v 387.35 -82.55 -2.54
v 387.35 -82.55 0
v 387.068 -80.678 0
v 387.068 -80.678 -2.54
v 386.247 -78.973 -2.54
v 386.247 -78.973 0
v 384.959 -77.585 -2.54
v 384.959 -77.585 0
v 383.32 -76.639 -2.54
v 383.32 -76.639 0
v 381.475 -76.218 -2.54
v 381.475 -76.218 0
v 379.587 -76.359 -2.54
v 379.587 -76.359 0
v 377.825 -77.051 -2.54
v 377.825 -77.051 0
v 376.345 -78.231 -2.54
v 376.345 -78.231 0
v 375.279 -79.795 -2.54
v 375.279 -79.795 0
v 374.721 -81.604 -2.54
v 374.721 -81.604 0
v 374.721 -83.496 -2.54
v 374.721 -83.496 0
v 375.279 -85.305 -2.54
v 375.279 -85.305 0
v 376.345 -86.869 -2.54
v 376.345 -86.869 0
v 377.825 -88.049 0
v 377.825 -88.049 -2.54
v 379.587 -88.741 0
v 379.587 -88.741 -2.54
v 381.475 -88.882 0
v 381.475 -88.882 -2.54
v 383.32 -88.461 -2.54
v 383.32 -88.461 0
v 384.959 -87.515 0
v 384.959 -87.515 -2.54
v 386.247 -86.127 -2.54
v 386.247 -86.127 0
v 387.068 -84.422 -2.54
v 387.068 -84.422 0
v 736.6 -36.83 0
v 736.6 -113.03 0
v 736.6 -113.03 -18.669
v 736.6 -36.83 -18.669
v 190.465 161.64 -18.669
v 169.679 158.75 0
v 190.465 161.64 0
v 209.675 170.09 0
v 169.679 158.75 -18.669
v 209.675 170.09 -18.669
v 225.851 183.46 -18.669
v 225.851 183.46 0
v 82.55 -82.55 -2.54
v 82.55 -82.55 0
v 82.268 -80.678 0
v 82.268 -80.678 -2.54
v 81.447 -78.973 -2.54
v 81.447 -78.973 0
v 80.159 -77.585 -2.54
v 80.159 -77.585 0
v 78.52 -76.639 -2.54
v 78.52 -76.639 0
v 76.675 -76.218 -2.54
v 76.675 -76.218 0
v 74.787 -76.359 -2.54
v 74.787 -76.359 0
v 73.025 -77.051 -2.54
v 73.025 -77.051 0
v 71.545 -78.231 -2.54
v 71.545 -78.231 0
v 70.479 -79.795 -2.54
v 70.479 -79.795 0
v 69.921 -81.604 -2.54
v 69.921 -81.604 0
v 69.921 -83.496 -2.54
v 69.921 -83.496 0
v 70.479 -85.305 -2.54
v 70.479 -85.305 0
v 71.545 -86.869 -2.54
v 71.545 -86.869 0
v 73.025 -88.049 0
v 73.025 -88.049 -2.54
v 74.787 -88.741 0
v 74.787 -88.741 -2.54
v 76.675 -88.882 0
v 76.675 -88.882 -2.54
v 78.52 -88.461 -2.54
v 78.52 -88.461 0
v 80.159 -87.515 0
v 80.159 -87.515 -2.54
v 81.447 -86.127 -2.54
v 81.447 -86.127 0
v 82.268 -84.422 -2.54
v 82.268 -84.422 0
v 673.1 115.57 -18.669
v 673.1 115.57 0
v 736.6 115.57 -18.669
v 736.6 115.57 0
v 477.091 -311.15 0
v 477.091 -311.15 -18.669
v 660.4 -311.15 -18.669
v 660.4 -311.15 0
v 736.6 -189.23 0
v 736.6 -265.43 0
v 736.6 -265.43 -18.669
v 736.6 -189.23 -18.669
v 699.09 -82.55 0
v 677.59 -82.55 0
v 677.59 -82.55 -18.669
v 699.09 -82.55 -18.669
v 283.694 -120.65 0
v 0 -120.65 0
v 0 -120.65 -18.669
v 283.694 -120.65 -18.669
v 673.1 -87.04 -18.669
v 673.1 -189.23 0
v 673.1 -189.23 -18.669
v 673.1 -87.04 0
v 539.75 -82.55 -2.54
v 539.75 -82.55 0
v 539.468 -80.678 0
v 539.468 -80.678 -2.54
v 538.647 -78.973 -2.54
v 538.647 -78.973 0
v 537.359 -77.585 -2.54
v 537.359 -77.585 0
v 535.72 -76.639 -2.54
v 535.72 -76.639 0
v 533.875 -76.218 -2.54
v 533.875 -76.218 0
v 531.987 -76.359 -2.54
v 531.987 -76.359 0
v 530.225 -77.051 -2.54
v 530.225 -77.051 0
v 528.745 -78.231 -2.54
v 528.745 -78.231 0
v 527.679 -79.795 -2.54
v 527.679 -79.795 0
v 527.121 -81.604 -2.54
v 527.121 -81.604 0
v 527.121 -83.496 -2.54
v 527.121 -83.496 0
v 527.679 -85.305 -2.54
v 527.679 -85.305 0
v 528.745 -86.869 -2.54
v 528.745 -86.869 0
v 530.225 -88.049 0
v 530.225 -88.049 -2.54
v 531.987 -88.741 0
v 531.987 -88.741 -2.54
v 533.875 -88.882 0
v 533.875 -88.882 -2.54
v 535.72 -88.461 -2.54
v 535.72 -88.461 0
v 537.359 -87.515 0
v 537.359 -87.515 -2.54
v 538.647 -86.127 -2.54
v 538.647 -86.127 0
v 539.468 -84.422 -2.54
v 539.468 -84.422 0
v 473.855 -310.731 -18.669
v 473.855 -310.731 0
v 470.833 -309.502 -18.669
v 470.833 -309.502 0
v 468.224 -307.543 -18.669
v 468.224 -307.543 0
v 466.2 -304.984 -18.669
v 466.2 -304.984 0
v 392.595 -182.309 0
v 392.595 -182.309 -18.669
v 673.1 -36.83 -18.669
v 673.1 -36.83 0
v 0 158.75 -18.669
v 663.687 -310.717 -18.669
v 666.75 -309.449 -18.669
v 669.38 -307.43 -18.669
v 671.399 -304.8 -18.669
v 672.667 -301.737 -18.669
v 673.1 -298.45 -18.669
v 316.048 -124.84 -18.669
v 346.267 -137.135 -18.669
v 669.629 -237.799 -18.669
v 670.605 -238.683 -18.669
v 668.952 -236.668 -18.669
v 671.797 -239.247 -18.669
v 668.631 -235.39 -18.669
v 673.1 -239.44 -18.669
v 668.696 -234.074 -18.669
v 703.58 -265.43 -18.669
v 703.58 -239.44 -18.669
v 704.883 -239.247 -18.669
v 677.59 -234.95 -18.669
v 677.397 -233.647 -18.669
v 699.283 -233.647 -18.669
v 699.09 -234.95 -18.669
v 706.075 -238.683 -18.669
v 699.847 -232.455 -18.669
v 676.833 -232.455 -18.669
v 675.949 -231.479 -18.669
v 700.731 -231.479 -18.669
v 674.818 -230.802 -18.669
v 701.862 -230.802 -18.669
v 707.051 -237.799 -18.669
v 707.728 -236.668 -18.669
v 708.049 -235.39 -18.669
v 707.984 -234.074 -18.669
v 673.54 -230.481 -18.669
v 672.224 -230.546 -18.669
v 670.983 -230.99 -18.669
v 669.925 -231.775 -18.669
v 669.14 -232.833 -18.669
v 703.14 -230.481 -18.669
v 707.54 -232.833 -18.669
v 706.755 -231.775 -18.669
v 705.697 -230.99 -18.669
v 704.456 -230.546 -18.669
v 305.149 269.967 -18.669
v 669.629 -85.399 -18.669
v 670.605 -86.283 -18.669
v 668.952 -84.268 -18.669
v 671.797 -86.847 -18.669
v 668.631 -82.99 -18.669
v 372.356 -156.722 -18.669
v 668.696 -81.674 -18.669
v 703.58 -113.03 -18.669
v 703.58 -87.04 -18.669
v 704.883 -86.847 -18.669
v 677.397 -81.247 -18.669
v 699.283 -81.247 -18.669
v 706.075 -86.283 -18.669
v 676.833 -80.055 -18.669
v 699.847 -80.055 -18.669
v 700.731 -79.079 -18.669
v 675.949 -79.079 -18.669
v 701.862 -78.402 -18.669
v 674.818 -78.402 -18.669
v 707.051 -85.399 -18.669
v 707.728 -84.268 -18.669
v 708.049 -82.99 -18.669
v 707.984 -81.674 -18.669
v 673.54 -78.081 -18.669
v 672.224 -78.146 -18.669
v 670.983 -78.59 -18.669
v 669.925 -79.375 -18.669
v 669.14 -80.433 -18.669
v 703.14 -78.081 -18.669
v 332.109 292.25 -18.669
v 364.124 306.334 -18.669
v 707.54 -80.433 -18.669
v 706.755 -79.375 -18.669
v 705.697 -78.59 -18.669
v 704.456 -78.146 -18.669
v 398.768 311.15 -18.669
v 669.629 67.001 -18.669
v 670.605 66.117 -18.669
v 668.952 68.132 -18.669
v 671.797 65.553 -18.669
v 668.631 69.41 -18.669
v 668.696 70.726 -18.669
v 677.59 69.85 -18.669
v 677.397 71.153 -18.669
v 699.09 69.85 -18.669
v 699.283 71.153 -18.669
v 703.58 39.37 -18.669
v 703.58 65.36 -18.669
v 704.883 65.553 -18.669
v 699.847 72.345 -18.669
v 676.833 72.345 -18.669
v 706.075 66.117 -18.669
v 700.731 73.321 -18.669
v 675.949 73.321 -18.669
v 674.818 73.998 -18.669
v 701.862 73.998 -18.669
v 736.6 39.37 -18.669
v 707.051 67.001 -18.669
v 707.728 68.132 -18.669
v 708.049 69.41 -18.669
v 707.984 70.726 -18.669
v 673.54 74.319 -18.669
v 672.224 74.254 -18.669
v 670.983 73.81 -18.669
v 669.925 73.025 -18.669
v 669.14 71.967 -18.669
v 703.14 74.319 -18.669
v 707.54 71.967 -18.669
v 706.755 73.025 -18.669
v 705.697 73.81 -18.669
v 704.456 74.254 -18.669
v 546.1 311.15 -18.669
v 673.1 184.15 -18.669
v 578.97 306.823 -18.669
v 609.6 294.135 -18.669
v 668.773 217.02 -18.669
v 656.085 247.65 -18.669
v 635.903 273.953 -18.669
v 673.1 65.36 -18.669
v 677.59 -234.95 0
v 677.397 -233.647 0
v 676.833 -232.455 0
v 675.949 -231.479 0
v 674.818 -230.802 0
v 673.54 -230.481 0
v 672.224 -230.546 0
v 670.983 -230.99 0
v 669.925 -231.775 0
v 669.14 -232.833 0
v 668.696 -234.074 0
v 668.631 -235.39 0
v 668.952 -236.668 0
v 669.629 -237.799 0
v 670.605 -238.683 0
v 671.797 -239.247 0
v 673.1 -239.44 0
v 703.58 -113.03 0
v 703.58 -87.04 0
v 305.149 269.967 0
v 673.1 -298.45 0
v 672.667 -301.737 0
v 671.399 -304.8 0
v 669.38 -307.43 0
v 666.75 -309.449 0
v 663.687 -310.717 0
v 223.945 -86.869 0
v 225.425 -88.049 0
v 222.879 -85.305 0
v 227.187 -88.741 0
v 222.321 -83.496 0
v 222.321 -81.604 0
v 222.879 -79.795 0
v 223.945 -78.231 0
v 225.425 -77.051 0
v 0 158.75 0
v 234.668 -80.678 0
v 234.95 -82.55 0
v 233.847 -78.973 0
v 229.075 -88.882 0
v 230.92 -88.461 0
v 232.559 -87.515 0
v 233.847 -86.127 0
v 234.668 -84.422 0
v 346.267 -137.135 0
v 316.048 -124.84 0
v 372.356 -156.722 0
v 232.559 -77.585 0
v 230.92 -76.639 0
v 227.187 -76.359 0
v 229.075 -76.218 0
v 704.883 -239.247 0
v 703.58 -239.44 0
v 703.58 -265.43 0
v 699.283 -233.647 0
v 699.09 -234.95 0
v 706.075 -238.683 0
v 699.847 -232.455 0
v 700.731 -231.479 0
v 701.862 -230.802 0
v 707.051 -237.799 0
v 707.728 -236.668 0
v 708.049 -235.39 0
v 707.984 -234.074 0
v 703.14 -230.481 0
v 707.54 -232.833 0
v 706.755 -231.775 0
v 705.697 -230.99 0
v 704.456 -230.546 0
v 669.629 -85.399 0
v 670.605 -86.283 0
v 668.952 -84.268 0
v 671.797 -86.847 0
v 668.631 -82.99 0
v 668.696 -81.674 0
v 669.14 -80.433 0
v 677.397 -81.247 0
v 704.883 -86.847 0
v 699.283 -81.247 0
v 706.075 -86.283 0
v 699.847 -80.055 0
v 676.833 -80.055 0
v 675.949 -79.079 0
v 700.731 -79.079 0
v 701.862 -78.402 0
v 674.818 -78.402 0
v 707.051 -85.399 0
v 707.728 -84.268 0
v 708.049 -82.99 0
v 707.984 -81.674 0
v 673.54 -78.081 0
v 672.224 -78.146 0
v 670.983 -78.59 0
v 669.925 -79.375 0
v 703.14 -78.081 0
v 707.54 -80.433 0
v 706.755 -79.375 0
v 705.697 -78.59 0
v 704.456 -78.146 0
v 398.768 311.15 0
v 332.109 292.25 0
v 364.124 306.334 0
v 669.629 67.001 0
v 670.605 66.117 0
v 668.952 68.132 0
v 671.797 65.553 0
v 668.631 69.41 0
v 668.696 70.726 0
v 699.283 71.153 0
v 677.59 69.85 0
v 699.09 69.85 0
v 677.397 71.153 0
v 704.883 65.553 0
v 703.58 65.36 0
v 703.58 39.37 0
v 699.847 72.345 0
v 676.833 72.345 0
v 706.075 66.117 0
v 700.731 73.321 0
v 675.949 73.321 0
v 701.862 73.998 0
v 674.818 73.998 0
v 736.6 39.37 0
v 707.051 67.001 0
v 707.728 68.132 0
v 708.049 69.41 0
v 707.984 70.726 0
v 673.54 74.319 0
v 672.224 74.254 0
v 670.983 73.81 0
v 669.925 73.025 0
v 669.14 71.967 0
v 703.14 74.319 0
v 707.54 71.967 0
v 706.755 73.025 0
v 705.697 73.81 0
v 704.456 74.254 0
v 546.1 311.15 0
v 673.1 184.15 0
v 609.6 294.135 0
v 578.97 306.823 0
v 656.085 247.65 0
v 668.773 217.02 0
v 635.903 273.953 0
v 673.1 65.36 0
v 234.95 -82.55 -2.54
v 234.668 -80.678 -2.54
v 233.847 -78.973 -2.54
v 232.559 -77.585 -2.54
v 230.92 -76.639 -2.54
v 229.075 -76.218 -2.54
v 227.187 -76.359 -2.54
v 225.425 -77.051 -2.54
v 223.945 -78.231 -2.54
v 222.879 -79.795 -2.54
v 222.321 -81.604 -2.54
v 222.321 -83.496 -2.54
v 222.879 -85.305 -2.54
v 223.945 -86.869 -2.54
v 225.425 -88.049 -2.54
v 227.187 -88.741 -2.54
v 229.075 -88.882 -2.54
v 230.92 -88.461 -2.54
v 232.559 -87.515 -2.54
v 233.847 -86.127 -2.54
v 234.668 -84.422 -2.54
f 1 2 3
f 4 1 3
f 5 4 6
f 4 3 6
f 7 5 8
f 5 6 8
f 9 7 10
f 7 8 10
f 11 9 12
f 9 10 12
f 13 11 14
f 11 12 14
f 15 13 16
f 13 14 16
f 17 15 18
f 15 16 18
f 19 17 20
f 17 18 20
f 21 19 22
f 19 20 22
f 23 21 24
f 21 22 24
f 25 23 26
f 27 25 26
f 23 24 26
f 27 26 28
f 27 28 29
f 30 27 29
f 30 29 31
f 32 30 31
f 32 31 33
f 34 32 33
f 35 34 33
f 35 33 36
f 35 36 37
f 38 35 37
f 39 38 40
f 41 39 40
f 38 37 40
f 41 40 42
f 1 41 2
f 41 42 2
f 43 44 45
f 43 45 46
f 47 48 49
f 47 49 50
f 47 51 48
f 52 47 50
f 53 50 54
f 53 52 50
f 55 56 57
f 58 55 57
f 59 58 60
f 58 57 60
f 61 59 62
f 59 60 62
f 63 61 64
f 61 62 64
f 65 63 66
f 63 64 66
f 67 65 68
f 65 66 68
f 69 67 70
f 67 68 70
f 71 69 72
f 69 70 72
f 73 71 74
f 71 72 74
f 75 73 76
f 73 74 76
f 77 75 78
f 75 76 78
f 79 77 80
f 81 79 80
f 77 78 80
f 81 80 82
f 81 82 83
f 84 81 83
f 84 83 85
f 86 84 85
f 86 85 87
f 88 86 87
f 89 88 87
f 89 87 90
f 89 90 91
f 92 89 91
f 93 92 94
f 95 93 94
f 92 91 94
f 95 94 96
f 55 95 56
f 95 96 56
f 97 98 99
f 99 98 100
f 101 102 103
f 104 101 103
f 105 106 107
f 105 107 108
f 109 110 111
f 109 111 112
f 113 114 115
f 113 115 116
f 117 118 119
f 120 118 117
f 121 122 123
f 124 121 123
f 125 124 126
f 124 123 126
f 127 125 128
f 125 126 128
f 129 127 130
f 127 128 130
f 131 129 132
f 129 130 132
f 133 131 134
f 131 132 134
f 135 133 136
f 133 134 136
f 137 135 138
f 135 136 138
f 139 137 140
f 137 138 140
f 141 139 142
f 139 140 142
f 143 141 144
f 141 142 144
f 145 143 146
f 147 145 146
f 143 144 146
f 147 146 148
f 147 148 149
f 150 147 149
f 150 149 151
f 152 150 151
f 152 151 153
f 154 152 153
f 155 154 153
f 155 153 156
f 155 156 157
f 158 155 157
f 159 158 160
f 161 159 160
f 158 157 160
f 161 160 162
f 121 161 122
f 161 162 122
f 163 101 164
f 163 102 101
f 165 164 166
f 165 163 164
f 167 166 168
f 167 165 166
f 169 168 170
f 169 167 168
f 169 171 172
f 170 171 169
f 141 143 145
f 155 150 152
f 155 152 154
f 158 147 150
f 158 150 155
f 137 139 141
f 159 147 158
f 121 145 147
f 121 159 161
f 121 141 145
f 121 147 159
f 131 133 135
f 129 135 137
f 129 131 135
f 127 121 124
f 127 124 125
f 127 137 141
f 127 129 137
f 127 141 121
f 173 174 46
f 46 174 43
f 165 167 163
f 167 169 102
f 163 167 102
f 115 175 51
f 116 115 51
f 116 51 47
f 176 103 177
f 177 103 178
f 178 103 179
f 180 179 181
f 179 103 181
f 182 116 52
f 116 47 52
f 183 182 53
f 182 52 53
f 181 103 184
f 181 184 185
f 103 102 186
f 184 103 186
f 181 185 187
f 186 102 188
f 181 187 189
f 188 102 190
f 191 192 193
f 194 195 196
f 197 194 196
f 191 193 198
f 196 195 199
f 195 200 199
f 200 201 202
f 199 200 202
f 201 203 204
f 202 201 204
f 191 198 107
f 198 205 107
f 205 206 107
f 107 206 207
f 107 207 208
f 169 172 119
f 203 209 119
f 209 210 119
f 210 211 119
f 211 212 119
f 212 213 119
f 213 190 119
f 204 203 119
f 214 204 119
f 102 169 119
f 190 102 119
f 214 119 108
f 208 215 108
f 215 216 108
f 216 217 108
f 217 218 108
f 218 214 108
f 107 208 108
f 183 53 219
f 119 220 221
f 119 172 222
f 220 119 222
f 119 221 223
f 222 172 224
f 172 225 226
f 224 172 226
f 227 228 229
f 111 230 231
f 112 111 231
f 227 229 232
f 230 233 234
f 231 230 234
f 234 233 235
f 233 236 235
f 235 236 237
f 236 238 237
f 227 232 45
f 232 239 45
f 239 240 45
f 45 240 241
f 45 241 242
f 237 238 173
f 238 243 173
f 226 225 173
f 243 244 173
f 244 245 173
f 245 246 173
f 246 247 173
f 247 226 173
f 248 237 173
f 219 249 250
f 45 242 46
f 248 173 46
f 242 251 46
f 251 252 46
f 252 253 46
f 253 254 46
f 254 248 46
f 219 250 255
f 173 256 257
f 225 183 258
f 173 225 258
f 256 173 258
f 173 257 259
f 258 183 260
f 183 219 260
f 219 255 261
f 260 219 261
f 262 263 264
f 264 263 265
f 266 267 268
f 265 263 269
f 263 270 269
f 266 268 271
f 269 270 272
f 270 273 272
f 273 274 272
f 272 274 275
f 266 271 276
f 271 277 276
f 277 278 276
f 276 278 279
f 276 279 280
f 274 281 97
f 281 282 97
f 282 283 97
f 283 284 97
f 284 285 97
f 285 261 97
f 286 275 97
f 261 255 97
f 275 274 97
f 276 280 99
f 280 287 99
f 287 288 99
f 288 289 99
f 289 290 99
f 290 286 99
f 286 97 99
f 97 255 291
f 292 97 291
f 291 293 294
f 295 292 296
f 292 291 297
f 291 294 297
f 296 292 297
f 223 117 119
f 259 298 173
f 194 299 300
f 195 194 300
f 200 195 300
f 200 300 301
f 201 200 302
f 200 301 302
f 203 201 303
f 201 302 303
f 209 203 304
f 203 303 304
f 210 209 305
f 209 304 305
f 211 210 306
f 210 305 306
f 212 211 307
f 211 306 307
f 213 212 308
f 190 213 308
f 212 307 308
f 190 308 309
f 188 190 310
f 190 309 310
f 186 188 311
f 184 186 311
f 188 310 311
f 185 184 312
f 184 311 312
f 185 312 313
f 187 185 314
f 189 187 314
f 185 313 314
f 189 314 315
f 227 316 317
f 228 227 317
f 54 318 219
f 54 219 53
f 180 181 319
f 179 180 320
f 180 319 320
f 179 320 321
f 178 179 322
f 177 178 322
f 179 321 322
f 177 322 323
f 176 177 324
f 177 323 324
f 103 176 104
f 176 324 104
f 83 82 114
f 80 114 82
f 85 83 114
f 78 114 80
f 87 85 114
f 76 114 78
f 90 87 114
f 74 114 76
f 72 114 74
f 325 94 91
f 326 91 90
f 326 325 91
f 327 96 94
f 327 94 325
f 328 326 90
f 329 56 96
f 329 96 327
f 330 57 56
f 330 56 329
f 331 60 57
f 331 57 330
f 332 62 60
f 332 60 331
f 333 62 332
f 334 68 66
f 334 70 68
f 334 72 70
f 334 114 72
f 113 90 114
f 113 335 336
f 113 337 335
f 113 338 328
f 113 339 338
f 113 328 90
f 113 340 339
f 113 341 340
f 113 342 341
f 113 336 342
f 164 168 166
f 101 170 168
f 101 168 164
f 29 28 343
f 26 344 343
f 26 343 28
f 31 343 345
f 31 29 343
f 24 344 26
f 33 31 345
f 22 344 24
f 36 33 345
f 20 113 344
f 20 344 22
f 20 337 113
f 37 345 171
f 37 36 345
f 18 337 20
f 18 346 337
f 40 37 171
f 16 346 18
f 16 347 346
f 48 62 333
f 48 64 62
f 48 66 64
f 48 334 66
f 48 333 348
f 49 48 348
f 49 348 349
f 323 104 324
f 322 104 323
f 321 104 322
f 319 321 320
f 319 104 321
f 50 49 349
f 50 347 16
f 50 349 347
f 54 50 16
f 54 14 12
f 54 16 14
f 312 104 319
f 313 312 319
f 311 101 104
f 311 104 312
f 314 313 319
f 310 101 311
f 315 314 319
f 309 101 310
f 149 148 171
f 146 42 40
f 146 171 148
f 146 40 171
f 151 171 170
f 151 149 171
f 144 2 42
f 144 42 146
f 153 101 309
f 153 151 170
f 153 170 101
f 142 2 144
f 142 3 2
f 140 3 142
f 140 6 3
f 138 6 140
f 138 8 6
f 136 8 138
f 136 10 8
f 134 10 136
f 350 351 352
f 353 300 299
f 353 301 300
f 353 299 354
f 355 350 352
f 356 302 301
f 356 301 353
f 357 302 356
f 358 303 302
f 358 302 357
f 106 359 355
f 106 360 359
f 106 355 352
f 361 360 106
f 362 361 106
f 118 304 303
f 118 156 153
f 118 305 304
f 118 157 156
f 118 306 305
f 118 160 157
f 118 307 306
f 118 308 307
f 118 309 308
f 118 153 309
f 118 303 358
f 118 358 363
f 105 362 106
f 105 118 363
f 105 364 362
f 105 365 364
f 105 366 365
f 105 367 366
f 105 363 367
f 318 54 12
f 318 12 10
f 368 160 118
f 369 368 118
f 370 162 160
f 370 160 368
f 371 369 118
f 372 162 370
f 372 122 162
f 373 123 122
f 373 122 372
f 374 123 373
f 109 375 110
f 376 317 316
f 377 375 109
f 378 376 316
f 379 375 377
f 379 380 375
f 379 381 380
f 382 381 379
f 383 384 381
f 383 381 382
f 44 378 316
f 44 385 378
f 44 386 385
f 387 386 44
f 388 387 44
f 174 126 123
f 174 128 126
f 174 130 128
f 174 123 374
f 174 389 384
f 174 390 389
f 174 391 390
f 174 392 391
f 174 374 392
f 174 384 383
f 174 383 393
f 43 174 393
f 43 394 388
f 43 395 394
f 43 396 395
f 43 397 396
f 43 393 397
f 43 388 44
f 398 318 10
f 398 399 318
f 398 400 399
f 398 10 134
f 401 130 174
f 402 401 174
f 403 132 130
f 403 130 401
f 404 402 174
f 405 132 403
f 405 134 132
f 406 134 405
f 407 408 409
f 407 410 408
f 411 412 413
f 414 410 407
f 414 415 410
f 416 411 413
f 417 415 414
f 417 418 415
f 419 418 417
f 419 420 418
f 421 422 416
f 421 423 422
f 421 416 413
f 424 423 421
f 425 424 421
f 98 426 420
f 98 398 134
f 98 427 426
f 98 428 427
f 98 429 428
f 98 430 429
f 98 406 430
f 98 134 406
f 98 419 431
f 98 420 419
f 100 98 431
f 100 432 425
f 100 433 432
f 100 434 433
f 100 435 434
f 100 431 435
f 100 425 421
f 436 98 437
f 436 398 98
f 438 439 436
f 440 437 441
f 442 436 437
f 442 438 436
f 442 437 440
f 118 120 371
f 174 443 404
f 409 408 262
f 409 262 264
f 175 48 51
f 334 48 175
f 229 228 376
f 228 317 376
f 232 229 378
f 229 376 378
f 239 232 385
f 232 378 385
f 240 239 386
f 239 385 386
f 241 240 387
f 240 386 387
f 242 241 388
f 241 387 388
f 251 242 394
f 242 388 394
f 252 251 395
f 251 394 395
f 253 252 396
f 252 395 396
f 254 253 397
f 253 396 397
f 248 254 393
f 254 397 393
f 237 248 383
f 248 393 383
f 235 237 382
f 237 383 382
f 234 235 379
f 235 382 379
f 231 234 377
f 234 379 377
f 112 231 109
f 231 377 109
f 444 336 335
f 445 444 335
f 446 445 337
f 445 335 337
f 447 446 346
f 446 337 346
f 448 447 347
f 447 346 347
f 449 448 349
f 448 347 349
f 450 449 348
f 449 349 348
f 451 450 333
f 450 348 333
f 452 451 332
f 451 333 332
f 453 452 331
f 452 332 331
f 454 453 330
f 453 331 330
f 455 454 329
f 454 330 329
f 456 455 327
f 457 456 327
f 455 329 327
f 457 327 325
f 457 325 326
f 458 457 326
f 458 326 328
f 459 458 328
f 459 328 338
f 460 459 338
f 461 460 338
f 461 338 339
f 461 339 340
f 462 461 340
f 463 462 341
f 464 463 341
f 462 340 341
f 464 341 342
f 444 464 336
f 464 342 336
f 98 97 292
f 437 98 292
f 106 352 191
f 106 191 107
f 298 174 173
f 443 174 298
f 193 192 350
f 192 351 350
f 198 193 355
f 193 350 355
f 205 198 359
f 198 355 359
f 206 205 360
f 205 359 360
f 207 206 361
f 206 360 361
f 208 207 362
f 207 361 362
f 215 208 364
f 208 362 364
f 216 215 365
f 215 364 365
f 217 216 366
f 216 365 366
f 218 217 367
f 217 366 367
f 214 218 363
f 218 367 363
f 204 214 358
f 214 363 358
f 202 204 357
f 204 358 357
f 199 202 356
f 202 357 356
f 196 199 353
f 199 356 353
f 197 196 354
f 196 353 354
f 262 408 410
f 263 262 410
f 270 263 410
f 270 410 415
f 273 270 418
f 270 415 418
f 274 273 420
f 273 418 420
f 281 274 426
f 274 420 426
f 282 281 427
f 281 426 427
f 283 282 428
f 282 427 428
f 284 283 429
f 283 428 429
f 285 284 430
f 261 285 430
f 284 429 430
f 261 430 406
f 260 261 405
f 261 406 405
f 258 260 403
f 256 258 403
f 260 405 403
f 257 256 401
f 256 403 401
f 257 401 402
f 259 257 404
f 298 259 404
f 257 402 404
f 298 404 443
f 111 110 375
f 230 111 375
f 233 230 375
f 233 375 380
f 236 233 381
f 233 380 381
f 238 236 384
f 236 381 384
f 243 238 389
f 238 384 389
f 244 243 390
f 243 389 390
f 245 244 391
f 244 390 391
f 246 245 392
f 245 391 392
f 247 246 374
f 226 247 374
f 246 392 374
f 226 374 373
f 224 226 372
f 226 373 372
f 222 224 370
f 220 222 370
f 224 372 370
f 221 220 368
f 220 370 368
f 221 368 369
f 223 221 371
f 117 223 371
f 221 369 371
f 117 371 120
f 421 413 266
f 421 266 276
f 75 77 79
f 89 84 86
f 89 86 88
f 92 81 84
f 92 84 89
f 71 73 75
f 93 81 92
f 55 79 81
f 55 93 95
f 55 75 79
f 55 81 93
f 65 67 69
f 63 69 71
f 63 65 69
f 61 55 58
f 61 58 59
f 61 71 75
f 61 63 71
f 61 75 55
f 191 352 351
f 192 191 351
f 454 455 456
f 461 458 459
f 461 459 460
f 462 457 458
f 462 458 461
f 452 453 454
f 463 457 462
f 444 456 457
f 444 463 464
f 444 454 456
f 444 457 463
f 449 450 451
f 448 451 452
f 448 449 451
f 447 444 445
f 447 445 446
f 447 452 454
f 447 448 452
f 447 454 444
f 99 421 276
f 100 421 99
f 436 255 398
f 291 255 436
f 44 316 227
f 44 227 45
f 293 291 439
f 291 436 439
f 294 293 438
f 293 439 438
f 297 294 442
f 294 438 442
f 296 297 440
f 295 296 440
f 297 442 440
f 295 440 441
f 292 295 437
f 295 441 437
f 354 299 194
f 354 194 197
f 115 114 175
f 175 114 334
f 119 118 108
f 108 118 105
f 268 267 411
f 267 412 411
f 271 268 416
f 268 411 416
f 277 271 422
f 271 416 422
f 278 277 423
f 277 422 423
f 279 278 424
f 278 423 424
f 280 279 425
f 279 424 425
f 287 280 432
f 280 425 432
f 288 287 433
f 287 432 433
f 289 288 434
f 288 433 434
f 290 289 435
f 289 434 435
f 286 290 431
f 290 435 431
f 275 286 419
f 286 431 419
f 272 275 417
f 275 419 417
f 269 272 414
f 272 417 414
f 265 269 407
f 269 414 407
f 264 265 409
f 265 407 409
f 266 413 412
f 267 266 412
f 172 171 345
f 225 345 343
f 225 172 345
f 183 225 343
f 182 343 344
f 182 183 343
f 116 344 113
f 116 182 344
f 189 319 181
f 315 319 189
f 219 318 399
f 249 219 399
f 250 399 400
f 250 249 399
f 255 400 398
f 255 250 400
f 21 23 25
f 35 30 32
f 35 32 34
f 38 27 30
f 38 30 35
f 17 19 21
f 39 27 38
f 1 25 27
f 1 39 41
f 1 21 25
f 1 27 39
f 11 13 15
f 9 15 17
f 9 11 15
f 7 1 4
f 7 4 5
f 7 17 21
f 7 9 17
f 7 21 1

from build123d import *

# Parameters (mm, degrees)
SKETCH_W        = 1346.2
SKETCH_H        = 622.3
PAD_DEPTH       = 18.669
POCKET_DEPTH    = 18.67
POCKET001_DEPTH = 18.67
SKETCH003_W     = 63.5
SKETCH003_H     = 76.2
PAD001_DEPTH    = 18.669
FILLET_R        = 12.7
FILLET001_R     = 127
SKETCH004_W     = 30.48
SKETCH004_H     = 30.48
POCKET002_DEPTH = 18.67
SKETCH005_R     = 4.490128
POCKET003_DEPTH = 18.67
FILLET002_R     = 127
FILLET003_R     = 127
FILLET004_R     = 76.2
SKETCH006_W     = 736.6
SKETCH006_H     = 762
POCKET004_DEPTH = 18.67
SKETCH007_R     = 6.35
POCKET005_DEPTH = 2.54


with BuildPart() as part:
    # Sketch → Pad (new body)
    with BuildSketch(Plane.XY):
        Rectangle(SKETCH_W, SKETCH_H)
    extrude(amount=PAD_DEPTH)

    # Sketch001 (on Face6 of Pad) → Pocket (cut, through all)
    with BuildSketch(Plane.XY.offset(18.669)):
        Polygon((-355.6, -120.65), (355.6, -120.65), (469.9, -311.15), (-469.9, -311.15), align=None)
    extrude(amount=-POCKET_DEPTH, mode=Mode.SUBTRACT)

    # Sketch002 (on Face5 of Pocket) → Pocket001 (cut, through all)
    with BuildSketch(Plane.XY.offset(18.669)):
        Polygon((-342.9, 311.15), (342.9, 311.15), (203.2, 158.75), (-203.2, 158.75), align=None)
    extrude(amount=-POCKET001_DEPTH, mode=Mode.SUBTRACT)

    # Sketch003 (on Face4 of Pocket001) → Pad001 (join)
    with BuildSketch(Plane.XY.offset(18.669)):
        with Locations((704.85, 77.47)):
            Rectangle(SKETCH003_W, SKETCH003_H)
        with Locations((704.85, -74.93)):
            Rectangle(SKETCH003_W, SKETCH003_H)
        with Locations((704.85, -227.33)):
            Rectangle(SKETCH003_W, SKETCH003_H)
        with Locations((-704.85, -227.33)):
            Rectangle(SKETCH003_W, SKETCH003_H)
        with Locations((-704.85, 77.47)):
            Rectangle(SKETCH003_W, SKETCH003_H)
        with Locations((-704.85, -74.93)):
            Rectangle(SKETCH003_W, SKETCH003_H)
    extrude(amount=-PAD001_DEPTH)

    # Fillet
    fillet_edges = [part.edges().sort_by_distance(p)[0] for p in [
        (673.1, -311.15, 9.3345),
        (-673.1, -311.15, 9.3345),
        (-469.9, -311.15, 9.3345),
        (469.9, -311.15, 9.3345),
    ]]
    fillet(fillet_edges, radius=FILLET_R)

    # Fillet001
    fillet001_edges = [part.edges().sort_by_distance(p)[0] for p in [
        (-673.1, 311.15, 9.3345),
        (673.1, 311.15, 9.3345),
    ]]
    fillet(fillet001_edges, radius=FILLET001_R)

    # Sketch004 (on Face52 of Fillet001) → Pocket002 (cut, through all)
    with BuildSketch(Plane.XY.offset(18.669)):
        with Locations((-688.34, 54.61)):
            Rectangle(SKETCH004_W, SKETCH004_H)
        with Locations((-688.34, -97.79)):
            Rectangle(SKETCH004_W, SKETCH004_H)
        with Locations((-688.34, -250.19)):
            Rectangle(SKETCH004_W, SKETCH004_H)
        with Locations((688.34, -250.19)):
            Rectangle(SKETCH004_W, SKETCH004_H)
        with Locations((688.34, -97.79)):
            Rectangle(SKETCH004_W, SKETCH004_H)
        with Locations((688.34, 54.61)):
            Rectangle(SKETCH004_W, SKETCH004_H)
    extrude(amount=-POCKET002_DEPTH, mode=Mode.SUBTRACT)

    # Sketch005 (on Face69 of Pocket002) → Pocket003 (cut, through all)
    with BuildSketch(Plane.XY.offset(18.669)):
        with Locations((703.58, -234.95)):
            Circle(SKETCH005_R)
        with Locations((673.1, -234.95)):
            Circle(SKETCH005_R)
        with Locations((703.58, -82.55)):
            Circle(SKETCH005_R)
        with Locations((673.1, -82.55)):
            Circle(SKETCH005_R)
        with Locations((703.58, 69.85)):
            Circle(SKETCH005_R)
        with Locations((673.1, 69.85)):
            Circle(SKETCH005_R)
        with Locations((-673.1, 69.85)):
            Circle(SKETCH005_R)
        with Locations((-703.58, 69.85)):
            Circle(SKETCH005_R)
        with Locations((-673.1, -82.55)):
            Circle(SKETCH005_R)
        with Locations((-703.58, -82.55)):
            Circle(SKETCH005_R)
        with Locations((-703.58, -234.95)):
            Circle(SKETCH005_R)
        with Locations((-673.1, -234.95)):
            Circle(SKETCH005_R)
    extrude(amount=-POCKET003_DEPTH, mode=Mode.SUBTRACT)

    # Fillet002
    fillet002_edges = [part.edges().sort_by_distance(p)[0] for p in [
        (-355.6, -120.65, 9.3345),
        (355.6, -120.65, 9.3345),
    ]]
    fillet(fillet002_edges, radius=FILLET002_R)

    # Fillet003
    fillet003_edges = [part.edges().sort_by_distance(p)[0] for p in [
        (-342.9, 311.15, 9.3345),
        (342.9, 311.15, 9.3345),
    ]]
    fillet(fillet003_edges, radius=FILLET003_R)

    # Fillet004
    fillet004_edges = [part.edges().sort_by_distance(p)[0] for p in [
        (-203.2, 158.75, 9.3345),
        (203.2, 158.75, 9.3345),
    ]]
    fillet(fillet004_edges, radius=FILLET004_R)

    # Sketch006 (on Face53 of Fillet004) → Pocket004 (cut, through all)
    with BuildSketch(Plane.XY.offset(18.669)):
        with Locations((-368.3, 0)):
            Rectangle(SKETCH006_W, SKETCH006_H)
    extrude(amount=-POCKET004_DEPTH, mode=Mode.SUBTRACT)

    # Sketch007 (on Face28 of Pocket004) → Pocket005 (cut)
    with BuildSketch(Plane.XY.offset(18.669)):
        with Locations((76.2, -82.55)):
            Circle(SKETCH007_R)
        with Locations((228.6, -82.55)):
            Circle(SKETCH007_R)
        with Locations((381, -82.55)):
            Circle(SKETCH007_R)
        with Locations((533.4, -82.55)):
            Circle(SKETCH007_R)
    extrude(amount=-POCKET005_DEPTH, mode=Mode.SUBTRACT)


with BuildPart() as part_1:
    # Clone placement: moved
    add(part.part.moved(Location((0, 0, -18.669))))


solid = part_1.part
